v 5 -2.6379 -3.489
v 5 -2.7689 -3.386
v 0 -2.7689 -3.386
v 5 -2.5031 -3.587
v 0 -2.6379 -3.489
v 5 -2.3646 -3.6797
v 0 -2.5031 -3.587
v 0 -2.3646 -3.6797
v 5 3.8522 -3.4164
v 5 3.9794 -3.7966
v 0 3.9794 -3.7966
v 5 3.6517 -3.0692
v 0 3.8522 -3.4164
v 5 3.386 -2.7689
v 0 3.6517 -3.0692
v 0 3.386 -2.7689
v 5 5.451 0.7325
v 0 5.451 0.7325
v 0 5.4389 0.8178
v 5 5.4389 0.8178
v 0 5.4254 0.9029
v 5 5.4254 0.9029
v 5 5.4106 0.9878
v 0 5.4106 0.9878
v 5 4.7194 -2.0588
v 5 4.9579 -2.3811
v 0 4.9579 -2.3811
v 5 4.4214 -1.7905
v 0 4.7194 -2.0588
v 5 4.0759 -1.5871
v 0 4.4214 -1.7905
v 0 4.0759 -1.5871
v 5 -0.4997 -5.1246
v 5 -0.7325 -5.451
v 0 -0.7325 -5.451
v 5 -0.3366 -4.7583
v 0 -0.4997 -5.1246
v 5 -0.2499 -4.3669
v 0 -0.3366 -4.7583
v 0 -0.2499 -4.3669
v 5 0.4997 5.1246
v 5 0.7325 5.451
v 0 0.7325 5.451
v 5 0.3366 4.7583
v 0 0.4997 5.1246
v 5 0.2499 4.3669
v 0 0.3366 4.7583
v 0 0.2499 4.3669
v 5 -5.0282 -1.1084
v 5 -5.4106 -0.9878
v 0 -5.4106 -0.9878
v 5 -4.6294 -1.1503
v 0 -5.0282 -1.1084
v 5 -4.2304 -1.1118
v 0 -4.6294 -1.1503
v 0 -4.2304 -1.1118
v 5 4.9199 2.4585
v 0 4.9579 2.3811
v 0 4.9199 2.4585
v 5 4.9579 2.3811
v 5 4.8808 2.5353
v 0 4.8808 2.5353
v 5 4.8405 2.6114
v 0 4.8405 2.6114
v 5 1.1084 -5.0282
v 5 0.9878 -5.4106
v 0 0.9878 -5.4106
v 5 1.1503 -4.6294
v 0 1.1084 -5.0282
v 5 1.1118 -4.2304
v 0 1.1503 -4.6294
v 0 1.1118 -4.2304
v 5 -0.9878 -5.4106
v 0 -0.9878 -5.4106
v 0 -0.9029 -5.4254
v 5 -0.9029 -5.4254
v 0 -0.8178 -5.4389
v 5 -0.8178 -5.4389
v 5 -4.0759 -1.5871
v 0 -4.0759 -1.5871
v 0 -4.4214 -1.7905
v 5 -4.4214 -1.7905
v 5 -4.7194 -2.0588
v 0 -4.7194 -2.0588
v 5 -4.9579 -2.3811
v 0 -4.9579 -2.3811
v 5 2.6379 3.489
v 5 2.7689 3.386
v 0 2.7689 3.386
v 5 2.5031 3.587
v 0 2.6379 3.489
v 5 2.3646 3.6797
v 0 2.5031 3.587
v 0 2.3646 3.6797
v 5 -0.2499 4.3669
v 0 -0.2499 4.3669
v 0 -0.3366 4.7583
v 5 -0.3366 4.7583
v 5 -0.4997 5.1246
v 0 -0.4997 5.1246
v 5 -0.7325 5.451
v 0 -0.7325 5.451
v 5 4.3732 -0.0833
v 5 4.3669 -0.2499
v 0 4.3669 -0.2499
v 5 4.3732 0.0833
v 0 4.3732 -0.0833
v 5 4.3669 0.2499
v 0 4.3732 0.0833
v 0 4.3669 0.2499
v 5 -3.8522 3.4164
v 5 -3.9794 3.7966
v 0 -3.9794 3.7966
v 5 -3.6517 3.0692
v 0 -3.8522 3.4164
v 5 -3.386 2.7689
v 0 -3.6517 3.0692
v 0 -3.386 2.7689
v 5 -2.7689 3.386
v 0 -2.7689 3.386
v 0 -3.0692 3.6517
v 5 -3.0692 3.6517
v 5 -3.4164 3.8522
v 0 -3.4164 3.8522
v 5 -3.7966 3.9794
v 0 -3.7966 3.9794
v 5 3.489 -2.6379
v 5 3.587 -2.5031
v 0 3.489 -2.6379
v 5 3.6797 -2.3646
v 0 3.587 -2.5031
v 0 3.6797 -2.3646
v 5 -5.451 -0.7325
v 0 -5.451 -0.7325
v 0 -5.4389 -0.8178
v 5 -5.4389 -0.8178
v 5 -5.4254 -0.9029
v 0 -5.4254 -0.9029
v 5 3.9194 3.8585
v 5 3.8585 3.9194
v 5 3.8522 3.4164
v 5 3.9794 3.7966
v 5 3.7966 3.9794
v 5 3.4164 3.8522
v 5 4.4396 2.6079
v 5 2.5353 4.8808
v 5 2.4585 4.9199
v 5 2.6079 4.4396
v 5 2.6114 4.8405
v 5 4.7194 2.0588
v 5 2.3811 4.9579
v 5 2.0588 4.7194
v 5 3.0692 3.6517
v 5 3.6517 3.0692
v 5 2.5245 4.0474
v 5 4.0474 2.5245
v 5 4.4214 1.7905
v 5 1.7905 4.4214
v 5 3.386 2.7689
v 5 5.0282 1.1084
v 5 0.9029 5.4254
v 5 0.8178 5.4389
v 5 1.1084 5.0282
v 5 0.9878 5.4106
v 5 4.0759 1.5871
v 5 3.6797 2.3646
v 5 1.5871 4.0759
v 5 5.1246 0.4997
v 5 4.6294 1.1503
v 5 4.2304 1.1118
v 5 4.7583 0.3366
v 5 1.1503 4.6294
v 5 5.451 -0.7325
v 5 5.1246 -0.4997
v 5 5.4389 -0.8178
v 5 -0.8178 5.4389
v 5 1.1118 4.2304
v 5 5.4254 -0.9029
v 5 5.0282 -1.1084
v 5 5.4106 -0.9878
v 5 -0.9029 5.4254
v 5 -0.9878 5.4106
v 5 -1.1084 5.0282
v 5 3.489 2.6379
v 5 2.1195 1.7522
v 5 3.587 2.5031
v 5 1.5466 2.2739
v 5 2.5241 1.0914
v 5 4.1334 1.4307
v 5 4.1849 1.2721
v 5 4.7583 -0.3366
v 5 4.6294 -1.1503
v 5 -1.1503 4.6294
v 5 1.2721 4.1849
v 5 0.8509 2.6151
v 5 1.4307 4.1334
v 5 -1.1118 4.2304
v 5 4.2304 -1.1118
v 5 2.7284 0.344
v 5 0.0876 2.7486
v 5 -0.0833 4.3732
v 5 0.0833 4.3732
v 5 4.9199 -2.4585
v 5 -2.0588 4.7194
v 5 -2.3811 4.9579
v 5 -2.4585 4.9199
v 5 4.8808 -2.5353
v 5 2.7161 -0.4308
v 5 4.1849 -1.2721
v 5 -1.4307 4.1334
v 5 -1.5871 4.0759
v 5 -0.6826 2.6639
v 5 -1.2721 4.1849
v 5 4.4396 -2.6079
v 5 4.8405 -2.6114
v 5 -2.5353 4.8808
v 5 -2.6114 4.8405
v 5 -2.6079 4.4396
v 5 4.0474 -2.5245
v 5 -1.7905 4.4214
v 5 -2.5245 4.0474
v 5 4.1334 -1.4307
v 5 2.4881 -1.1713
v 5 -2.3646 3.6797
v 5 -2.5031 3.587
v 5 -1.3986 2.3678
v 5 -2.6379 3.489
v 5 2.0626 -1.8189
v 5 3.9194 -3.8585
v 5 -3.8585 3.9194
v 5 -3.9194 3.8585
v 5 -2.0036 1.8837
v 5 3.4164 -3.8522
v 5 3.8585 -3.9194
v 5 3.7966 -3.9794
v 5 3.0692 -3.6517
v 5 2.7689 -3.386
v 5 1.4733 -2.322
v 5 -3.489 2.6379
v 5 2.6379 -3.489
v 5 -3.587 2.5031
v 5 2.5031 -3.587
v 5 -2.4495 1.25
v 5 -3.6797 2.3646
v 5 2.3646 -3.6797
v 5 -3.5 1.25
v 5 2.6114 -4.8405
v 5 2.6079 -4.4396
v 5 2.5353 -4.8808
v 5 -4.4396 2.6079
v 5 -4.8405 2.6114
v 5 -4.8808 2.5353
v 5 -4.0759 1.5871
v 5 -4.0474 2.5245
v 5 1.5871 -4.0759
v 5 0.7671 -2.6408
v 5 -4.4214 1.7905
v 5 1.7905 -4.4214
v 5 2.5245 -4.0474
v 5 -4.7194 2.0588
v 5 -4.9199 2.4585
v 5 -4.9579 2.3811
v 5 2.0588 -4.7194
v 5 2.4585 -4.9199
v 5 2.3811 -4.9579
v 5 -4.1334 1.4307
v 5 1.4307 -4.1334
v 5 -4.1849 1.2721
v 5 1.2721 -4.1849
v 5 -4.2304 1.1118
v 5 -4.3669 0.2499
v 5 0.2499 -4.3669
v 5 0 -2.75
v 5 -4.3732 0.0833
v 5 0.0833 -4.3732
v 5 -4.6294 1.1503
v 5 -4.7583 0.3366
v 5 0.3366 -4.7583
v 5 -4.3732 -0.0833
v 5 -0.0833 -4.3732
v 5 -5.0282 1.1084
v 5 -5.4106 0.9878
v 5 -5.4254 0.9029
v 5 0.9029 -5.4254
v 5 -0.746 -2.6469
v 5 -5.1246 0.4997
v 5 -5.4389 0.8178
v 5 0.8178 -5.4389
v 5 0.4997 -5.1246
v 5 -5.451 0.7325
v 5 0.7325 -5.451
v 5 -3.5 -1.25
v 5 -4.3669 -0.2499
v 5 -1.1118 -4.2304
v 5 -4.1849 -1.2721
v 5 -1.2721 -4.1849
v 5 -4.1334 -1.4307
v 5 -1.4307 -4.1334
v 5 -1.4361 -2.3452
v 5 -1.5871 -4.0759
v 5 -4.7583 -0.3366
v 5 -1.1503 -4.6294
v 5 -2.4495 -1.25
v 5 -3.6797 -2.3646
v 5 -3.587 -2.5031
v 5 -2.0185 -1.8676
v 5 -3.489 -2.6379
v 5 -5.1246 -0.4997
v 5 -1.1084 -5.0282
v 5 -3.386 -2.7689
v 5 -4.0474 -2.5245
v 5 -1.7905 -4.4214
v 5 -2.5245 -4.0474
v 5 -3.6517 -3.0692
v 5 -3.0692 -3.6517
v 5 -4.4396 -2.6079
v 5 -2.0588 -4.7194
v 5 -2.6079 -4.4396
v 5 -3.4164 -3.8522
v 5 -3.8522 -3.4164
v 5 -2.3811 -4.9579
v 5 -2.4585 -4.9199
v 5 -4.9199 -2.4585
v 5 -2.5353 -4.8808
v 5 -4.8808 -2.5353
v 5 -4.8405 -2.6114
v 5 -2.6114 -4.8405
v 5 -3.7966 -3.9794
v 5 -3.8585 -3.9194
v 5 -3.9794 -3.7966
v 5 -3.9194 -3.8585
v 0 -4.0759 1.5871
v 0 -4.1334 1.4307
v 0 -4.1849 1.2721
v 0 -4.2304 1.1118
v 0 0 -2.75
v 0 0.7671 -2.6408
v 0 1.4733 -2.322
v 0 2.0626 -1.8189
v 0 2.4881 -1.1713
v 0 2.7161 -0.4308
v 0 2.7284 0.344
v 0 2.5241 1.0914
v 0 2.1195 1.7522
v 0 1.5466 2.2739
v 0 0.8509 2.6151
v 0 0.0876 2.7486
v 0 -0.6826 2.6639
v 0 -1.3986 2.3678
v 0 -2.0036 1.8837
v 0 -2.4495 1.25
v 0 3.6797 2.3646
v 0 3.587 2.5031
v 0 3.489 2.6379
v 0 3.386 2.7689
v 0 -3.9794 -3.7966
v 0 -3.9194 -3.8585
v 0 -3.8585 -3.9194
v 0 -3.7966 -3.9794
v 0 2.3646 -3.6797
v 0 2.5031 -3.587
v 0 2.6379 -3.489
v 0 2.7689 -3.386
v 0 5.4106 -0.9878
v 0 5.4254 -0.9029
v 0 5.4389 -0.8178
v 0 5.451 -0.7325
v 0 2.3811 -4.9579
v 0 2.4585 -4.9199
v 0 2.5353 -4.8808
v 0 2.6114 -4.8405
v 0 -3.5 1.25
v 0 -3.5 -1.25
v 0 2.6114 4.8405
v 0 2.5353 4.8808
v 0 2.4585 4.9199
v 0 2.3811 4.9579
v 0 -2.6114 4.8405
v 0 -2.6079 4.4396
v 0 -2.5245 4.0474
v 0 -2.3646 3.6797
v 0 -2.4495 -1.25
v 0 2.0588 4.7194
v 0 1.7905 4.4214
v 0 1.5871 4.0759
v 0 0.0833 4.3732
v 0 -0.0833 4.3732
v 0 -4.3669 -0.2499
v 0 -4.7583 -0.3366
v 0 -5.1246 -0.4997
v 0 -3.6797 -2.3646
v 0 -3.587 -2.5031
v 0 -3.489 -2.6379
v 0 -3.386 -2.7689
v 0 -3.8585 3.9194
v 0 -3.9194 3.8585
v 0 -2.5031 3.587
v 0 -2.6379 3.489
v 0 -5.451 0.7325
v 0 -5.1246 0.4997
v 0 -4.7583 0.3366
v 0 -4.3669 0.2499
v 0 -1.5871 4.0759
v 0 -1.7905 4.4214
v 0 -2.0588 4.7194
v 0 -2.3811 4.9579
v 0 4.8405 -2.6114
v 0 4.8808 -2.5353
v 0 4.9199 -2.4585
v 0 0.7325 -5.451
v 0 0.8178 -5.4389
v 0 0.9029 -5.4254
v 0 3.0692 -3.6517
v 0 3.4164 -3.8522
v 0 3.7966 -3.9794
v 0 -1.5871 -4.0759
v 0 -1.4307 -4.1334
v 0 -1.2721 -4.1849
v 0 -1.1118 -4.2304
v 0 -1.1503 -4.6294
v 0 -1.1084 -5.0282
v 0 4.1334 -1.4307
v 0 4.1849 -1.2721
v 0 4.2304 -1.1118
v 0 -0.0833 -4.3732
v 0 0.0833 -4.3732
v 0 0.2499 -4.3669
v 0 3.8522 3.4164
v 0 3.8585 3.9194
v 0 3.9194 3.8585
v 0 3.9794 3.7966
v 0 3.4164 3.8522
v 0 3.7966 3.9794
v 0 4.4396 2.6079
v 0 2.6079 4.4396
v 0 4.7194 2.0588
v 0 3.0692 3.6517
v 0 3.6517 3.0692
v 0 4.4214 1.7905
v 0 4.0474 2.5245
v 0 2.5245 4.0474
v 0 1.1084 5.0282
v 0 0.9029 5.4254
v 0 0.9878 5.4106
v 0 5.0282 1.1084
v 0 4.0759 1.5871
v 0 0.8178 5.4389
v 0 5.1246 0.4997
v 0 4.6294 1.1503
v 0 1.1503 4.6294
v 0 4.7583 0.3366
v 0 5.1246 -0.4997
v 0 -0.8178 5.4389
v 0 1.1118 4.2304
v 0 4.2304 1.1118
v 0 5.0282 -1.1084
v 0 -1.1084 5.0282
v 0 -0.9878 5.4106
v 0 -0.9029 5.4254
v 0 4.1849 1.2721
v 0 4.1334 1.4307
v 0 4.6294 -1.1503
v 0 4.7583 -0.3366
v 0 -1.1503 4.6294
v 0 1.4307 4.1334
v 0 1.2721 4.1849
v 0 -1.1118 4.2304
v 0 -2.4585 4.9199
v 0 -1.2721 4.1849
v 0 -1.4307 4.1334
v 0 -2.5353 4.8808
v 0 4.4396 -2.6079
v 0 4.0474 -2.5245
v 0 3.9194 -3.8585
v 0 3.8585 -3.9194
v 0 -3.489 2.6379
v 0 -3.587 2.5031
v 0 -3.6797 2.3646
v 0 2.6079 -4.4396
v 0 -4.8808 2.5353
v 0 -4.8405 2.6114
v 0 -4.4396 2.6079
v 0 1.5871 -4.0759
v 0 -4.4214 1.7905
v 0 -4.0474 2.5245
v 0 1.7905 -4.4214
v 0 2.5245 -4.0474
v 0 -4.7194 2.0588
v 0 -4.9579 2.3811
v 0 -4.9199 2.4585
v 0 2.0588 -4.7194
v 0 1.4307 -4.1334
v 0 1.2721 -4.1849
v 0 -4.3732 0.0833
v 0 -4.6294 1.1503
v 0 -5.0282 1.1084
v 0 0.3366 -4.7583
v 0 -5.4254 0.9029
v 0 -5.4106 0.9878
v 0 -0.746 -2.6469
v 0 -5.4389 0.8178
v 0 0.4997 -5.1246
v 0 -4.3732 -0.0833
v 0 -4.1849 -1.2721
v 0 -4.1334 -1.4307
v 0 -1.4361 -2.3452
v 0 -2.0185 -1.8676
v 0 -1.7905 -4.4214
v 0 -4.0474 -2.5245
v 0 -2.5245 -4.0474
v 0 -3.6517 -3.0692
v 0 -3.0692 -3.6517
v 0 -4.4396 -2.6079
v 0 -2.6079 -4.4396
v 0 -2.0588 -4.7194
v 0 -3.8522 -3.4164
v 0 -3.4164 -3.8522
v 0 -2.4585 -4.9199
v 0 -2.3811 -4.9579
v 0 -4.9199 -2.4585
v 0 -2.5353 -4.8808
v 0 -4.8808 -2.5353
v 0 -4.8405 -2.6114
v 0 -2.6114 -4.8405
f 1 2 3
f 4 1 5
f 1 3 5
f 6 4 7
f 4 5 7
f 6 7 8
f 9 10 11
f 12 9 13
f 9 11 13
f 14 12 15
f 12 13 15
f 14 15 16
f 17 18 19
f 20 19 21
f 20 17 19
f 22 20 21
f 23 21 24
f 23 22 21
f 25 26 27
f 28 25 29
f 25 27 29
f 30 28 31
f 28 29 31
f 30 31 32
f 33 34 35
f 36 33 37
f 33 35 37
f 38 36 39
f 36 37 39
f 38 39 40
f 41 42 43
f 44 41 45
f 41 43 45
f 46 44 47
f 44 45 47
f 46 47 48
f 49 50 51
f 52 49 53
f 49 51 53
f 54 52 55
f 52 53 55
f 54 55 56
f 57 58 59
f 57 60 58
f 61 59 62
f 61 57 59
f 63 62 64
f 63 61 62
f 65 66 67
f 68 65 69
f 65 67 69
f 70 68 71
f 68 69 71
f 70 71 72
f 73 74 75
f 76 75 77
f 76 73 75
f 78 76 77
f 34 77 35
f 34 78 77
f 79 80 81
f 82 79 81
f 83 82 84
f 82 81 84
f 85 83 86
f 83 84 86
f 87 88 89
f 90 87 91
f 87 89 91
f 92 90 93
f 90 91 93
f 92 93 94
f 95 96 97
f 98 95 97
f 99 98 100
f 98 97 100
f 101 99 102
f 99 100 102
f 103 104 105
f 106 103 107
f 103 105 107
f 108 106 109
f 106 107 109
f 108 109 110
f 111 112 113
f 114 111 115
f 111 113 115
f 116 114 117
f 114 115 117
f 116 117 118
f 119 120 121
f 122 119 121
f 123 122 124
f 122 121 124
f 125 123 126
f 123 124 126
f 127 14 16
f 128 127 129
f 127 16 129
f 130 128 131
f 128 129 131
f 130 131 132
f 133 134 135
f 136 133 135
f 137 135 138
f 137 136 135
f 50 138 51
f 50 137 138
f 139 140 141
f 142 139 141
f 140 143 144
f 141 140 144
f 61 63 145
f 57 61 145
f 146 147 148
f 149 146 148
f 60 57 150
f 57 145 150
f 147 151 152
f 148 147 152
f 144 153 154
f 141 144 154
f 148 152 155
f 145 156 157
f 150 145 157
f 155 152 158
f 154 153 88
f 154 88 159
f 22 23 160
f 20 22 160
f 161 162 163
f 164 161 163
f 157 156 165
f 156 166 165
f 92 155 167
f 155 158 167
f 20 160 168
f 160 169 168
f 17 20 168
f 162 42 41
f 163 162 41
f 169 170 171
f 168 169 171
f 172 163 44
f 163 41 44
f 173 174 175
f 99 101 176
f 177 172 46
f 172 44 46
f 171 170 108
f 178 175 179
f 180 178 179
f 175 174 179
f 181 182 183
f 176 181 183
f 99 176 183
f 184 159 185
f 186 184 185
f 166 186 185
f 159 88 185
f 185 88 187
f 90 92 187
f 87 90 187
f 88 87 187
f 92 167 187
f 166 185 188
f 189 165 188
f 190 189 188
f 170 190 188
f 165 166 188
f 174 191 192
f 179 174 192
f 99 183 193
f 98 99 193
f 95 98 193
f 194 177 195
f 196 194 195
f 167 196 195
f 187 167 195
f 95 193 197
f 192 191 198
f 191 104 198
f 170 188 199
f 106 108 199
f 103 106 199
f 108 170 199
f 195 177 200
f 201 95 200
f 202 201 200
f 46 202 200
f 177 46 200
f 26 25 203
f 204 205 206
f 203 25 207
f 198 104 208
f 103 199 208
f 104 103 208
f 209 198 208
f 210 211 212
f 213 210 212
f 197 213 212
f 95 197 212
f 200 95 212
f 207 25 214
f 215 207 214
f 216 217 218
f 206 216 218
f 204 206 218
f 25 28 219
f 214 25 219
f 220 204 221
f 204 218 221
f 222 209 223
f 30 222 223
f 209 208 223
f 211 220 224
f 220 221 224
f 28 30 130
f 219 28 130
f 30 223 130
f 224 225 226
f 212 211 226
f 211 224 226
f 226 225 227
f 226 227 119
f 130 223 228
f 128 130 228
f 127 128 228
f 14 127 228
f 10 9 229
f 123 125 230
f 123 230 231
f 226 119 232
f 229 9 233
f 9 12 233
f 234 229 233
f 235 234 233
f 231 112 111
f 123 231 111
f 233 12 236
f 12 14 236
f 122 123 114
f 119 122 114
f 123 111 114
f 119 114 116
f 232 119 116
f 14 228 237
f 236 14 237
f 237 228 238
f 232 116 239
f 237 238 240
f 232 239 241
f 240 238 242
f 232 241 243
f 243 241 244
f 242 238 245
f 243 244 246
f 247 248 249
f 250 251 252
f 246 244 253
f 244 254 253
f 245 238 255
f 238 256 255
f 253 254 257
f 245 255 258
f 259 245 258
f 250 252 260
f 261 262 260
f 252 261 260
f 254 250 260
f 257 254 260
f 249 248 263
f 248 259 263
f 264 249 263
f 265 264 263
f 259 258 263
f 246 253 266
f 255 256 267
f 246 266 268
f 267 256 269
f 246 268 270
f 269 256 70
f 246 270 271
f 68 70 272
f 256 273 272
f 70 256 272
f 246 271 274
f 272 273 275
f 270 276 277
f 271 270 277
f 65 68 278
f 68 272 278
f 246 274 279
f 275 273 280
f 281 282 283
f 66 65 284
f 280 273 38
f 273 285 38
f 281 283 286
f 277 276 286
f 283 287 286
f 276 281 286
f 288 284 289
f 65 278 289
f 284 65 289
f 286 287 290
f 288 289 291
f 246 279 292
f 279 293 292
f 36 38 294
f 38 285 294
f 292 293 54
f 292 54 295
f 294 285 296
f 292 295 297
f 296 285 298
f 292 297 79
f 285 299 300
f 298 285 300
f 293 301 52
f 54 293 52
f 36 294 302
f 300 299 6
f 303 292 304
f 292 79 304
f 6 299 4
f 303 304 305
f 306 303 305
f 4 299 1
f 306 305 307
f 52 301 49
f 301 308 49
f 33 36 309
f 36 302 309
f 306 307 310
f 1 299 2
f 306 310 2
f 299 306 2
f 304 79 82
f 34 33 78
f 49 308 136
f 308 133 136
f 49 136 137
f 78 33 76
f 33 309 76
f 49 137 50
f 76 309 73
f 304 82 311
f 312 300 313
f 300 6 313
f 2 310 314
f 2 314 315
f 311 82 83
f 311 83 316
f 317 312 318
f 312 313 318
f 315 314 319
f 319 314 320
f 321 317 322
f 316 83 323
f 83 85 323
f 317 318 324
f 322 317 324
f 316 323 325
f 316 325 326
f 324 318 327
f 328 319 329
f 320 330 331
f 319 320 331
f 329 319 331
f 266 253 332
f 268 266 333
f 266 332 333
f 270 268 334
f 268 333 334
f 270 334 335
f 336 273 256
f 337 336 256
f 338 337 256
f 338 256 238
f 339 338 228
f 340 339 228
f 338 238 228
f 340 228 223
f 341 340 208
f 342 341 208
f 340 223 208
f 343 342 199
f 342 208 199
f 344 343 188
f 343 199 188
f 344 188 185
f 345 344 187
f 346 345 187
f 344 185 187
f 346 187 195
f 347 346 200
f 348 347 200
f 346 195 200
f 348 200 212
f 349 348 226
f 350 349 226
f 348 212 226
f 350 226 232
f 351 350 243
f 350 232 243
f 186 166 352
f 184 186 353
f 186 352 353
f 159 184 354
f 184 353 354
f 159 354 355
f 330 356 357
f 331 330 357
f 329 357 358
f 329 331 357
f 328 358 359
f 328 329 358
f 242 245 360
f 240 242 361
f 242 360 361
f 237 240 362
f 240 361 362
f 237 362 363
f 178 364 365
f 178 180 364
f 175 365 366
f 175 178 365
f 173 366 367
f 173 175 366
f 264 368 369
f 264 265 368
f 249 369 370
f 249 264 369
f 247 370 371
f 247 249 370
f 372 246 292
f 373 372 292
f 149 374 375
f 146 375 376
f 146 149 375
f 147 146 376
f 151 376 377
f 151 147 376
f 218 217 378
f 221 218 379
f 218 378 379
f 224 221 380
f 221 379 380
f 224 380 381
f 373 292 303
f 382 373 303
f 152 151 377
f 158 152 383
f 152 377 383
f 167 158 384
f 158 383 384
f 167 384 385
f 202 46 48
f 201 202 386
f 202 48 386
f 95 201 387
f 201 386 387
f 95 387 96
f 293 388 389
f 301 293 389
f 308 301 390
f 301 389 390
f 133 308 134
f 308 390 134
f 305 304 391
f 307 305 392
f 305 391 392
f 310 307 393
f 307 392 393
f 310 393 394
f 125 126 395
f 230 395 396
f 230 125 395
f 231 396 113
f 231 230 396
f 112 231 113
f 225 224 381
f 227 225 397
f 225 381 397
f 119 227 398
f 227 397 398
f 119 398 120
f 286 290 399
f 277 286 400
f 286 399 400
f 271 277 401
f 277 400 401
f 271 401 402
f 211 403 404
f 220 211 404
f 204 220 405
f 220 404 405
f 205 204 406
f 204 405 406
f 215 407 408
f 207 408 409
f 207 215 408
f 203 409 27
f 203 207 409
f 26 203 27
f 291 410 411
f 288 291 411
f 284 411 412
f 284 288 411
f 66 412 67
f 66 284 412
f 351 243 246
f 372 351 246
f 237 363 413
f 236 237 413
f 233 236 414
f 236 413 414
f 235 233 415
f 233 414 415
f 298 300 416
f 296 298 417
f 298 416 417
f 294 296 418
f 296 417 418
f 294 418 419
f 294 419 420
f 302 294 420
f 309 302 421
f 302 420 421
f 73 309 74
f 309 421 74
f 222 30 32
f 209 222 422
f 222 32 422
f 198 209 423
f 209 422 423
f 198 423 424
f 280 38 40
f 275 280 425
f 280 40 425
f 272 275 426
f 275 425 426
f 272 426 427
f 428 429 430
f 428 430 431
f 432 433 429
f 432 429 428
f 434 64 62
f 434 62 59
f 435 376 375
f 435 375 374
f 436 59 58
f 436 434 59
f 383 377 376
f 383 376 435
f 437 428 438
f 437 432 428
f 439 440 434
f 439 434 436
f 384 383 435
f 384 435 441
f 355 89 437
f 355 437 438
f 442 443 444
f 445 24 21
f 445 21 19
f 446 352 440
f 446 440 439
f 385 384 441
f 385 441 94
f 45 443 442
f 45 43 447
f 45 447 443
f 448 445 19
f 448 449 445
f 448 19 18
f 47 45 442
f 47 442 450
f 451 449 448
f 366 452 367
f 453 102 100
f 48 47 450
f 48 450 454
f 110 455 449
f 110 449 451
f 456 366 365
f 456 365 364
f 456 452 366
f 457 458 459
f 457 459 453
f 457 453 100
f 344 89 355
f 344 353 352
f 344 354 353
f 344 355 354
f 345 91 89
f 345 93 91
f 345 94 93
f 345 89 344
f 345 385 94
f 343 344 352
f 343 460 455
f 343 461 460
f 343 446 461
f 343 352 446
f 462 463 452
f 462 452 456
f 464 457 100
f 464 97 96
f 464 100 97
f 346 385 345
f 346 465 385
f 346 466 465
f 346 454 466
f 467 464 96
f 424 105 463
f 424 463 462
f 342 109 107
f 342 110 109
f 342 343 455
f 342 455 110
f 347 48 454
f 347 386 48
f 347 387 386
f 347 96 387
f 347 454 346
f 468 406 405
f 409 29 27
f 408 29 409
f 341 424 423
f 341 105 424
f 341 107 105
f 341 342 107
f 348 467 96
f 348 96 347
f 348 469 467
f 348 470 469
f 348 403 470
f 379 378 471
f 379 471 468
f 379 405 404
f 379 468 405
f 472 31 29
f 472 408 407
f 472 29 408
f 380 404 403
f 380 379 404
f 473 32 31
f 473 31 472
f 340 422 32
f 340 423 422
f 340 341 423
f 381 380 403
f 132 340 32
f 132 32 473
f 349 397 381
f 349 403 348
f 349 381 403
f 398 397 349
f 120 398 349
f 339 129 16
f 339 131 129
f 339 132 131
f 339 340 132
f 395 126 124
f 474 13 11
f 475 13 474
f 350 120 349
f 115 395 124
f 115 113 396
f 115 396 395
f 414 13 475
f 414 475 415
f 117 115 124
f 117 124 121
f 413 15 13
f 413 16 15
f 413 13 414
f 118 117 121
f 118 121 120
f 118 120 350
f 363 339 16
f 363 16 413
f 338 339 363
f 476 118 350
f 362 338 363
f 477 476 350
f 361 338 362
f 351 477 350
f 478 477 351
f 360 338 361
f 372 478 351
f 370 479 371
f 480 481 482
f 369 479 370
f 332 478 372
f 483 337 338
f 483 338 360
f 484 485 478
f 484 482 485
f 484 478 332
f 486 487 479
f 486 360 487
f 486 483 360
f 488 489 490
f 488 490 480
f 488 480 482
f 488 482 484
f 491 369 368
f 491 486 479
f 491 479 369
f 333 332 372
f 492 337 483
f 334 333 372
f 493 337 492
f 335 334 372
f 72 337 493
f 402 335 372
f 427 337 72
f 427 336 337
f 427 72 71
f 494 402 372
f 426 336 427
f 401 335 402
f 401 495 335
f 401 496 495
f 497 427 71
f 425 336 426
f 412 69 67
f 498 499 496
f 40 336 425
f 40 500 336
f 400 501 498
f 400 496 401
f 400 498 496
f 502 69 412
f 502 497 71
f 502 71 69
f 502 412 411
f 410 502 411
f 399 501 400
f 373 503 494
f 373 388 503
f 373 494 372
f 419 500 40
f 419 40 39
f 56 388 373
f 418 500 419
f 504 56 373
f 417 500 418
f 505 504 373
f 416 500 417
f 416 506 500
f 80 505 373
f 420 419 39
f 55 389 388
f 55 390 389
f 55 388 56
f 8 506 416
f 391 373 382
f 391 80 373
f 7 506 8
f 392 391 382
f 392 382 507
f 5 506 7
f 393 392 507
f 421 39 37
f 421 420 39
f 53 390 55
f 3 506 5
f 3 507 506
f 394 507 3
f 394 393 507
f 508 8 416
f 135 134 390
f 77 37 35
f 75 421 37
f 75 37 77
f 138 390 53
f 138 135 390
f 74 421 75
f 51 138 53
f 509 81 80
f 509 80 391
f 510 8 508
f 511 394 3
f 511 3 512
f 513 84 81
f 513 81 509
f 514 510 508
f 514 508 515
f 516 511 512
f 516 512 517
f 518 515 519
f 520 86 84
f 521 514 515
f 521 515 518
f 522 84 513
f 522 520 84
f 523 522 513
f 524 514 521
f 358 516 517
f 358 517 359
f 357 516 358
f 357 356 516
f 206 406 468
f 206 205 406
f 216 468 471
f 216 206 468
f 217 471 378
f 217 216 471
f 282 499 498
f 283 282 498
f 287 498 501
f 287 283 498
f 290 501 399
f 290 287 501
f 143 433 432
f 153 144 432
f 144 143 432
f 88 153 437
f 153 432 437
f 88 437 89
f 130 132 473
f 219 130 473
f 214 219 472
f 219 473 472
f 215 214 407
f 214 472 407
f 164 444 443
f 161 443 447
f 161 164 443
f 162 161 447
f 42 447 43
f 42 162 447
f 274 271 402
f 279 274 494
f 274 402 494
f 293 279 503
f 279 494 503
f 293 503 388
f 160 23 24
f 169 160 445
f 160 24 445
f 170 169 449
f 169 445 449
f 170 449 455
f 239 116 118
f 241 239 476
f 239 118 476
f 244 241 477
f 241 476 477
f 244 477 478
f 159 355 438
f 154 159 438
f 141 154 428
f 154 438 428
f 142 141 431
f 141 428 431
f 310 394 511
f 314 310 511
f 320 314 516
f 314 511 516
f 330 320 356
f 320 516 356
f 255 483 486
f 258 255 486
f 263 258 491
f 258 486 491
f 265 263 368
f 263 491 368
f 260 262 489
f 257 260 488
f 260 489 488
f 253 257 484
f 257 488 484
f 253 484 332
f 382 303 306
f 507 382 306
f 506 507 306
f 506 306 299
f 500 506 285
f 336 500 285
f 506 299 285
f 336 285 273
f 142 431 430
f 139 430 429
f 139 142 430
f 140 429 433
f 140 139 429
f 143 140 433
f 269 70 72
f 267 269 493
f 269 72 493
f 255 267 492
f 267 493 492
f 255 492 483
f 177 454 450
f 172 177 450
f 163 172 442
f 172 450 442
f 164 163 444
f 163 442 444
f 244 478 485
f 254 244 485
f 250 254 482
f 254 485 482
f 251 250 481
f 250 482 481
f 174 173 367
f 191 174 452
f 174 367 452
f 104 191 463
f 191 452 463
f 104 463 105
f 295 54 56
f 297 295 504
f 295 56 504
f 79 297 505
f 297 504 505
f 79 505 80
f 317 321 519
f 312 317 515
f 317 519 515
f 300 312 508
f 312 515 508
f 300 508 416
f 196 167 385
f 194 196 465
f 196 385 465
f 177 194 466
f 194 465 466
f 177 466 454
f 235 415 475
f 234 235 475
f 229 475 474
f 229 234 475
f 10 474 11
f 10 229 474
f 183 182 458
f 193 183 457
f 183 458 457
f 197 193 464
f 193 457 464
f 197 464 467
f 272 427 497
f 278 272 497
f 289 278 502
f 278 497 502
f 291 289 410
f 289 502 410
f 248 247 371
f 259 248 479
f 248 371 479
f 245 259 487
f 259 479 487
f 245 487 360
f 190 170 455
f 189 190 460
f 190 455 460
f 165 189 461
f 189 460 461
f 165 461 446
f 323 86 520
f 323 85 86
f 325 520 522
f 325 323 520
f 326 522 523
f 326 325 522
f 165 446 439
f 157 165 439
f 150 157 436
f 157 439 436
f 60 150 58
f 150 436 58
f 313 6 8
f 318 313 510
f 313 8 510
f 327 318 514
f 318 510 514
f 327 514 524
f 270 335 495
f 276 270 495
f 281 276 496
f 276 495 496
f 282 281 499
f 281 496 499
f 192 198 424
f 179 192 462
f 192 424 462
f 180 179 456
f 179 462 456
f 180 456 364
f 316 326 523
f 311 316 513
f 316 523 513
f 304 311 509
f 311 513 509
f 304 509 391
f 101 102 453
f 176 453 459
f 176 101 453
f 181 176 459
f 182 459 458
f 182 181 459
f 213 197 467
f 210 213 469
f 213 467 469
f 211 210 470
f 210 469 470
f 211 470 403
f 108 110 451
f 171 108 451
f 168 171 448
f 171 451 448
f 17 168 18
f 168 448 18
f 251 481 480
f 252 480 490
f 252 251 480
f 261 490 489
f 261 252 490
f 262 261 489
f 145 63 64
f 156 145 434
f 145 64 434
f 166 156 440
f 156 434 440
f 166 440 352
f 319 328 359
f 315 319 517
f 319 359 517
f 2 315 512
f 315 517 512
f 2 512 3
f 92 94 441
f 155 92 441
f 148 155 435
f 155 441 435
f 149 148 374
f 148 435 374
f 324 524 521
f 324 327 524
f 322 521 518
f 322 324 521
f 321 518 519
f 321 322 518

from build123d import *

# Parameters (mm, degrees)
BASPROSKE_W             = 5
BASPROSKE_H             = 5.5
TOOTHCUT_DEPTH          = 10.246621004
TEETHCUTS_COUNT         = 20
TEETHCUTS_ANGLE         = 342
BORSKE_R                = 0.5
BORE_DEPTH              = 50.0000508
CUT_EXTRUDE1_DEPTH      = 10.188413972
CUT_EXTRUDE1_DEPTH_BACK = 10.188413972


with BuildPart() as part:
    # BasProSke → Base-Revolve (revolve)
    with BuildSketch(Plane(origin=(0, 0, 0), x_dir=(1, 0, 0), z_dir=(0, 1, 0)), mode=Mode.PRIVATE) as base_revolve_sk:
        with Locations((2.5, 2.75)):
            Rectangle(BASPROSKE_W, BASPROSKE_H)
    revolve(base_revolve_sk.sketch.rotate(Axis((-10, 0, 0), (1, 0, 0)), 180), axis=Axis((-10, 0, 0), (1, 0, 0)))

    # TooCutSke → ToothCut (cut, through all)
    with BuildSketch(Plane(origin=(0, 0, 0), x_dir=(0, 0, -1), z_dir=(1, 0, 0))):
        with BuildLine():
            ThreePointArc((0.249903181, 4.366855207), (0, 4.374), (-0.249903181, 4.366855207))
            ThreePointArc((-0.249903181, 4.366855207), (-0.415207844, 4.95951031), (-0.752843848, 5.473871692))
            ThreePointArc((-0.752843848, 5.473871692), (0, 5.5254), (0.752843848, 5.473871692))
            ThreePointArc((0.752843848, 5.473871692), (0.415207844, 4.95951031), (0.249903181, 4.366855207))
        make_face()
    toothcut = extrude(amount=TOOTHCUT_DEPTH, mode=Mode.SUBTRACT)

    # TeethCuts: ToothCut ×20 about axis
    teethcuts_axis = Axis((-10, 0, 0), (1, 0, 0))
    for i in range(1, TEETHCUTS_COUNT):
        add(toothcut.rotate(teethcuts_axis, i * TEETHCUTS_ANGLE / (TEETHCUTS_COUNT - 1)), mode=Mode.SUBTRACT)

    # BorSke → Bore (cut, symmetric)
    with BuildSketch(Plane(origin=(0, 0, 0), x_dir=(0, 0, -1), z_dir=(1, 0, 0))):
        with Locations(Location((0, 0, 0), (0, 0, 180))):
            Circle(BORSKE_R)
    extrude(amount=BORE_DEPTH, both=True, mode=Mode.SUBTRACT)

    # Sketch1 → Cut-Extrude1 (cut, two sides)
    with BuildSketch(Plane(origin=(5, 0, 0), x_dir=(0, 0, -1), z_dir=(1, 0, 0))) as cut_extrude1_sk:
        with BuildLine():
            Line((1.25, -1.759357098), (-1.25, -1.759357098))
            Line((-1.25, -1.759357098), (-1.25, -2.449489743))
            ThreePointArc((-1.25, -2.449489743), (0, -2.75), (1.25, -2.449489743))
            Line((1.25, -2.449489743), (1.25, -1.759357098))
        make_face()
        with BuildLine():
            Line((-1.25, -2.449489743), (-1.25, -1.759357098))
            Line((-1.25, -1.759357098), (1.25, -1.759357098))
            Line((1.25, -1.759357098), (1.25, -2.449489743))
            ThreePointArc((1.25, -2.449489743), (2.34520788, -1.436140662), (2.75, 0))
            ThreePointArc((2.75, 0), (-1.436140662, 2.34520788), (-1.25, -2.449489743))
        make_face()
        with BuildLine():
            ThreePointArc((1.25, -2.449489743), (0, -2.75), (-1.25, -2.449489743))
            Line((-1.25, -2.449489743), (-1.25, -3.5))
            Line((-1.25, -3.5), (1.25, -3.5))
            Line((1.25, -3.5), (1.25, -2.449489743))
        make_face()
    extrude(amount=CUT_EXTRUDE1_DEPTH, mode=Mode.SUBTRACT)
    extrude(cut_extrude1_sk.sketch, amount=-CUT_EXTRUDE1_DEPTH_BACK, mode=Mode.SUBTRACT)


solid = part.part
